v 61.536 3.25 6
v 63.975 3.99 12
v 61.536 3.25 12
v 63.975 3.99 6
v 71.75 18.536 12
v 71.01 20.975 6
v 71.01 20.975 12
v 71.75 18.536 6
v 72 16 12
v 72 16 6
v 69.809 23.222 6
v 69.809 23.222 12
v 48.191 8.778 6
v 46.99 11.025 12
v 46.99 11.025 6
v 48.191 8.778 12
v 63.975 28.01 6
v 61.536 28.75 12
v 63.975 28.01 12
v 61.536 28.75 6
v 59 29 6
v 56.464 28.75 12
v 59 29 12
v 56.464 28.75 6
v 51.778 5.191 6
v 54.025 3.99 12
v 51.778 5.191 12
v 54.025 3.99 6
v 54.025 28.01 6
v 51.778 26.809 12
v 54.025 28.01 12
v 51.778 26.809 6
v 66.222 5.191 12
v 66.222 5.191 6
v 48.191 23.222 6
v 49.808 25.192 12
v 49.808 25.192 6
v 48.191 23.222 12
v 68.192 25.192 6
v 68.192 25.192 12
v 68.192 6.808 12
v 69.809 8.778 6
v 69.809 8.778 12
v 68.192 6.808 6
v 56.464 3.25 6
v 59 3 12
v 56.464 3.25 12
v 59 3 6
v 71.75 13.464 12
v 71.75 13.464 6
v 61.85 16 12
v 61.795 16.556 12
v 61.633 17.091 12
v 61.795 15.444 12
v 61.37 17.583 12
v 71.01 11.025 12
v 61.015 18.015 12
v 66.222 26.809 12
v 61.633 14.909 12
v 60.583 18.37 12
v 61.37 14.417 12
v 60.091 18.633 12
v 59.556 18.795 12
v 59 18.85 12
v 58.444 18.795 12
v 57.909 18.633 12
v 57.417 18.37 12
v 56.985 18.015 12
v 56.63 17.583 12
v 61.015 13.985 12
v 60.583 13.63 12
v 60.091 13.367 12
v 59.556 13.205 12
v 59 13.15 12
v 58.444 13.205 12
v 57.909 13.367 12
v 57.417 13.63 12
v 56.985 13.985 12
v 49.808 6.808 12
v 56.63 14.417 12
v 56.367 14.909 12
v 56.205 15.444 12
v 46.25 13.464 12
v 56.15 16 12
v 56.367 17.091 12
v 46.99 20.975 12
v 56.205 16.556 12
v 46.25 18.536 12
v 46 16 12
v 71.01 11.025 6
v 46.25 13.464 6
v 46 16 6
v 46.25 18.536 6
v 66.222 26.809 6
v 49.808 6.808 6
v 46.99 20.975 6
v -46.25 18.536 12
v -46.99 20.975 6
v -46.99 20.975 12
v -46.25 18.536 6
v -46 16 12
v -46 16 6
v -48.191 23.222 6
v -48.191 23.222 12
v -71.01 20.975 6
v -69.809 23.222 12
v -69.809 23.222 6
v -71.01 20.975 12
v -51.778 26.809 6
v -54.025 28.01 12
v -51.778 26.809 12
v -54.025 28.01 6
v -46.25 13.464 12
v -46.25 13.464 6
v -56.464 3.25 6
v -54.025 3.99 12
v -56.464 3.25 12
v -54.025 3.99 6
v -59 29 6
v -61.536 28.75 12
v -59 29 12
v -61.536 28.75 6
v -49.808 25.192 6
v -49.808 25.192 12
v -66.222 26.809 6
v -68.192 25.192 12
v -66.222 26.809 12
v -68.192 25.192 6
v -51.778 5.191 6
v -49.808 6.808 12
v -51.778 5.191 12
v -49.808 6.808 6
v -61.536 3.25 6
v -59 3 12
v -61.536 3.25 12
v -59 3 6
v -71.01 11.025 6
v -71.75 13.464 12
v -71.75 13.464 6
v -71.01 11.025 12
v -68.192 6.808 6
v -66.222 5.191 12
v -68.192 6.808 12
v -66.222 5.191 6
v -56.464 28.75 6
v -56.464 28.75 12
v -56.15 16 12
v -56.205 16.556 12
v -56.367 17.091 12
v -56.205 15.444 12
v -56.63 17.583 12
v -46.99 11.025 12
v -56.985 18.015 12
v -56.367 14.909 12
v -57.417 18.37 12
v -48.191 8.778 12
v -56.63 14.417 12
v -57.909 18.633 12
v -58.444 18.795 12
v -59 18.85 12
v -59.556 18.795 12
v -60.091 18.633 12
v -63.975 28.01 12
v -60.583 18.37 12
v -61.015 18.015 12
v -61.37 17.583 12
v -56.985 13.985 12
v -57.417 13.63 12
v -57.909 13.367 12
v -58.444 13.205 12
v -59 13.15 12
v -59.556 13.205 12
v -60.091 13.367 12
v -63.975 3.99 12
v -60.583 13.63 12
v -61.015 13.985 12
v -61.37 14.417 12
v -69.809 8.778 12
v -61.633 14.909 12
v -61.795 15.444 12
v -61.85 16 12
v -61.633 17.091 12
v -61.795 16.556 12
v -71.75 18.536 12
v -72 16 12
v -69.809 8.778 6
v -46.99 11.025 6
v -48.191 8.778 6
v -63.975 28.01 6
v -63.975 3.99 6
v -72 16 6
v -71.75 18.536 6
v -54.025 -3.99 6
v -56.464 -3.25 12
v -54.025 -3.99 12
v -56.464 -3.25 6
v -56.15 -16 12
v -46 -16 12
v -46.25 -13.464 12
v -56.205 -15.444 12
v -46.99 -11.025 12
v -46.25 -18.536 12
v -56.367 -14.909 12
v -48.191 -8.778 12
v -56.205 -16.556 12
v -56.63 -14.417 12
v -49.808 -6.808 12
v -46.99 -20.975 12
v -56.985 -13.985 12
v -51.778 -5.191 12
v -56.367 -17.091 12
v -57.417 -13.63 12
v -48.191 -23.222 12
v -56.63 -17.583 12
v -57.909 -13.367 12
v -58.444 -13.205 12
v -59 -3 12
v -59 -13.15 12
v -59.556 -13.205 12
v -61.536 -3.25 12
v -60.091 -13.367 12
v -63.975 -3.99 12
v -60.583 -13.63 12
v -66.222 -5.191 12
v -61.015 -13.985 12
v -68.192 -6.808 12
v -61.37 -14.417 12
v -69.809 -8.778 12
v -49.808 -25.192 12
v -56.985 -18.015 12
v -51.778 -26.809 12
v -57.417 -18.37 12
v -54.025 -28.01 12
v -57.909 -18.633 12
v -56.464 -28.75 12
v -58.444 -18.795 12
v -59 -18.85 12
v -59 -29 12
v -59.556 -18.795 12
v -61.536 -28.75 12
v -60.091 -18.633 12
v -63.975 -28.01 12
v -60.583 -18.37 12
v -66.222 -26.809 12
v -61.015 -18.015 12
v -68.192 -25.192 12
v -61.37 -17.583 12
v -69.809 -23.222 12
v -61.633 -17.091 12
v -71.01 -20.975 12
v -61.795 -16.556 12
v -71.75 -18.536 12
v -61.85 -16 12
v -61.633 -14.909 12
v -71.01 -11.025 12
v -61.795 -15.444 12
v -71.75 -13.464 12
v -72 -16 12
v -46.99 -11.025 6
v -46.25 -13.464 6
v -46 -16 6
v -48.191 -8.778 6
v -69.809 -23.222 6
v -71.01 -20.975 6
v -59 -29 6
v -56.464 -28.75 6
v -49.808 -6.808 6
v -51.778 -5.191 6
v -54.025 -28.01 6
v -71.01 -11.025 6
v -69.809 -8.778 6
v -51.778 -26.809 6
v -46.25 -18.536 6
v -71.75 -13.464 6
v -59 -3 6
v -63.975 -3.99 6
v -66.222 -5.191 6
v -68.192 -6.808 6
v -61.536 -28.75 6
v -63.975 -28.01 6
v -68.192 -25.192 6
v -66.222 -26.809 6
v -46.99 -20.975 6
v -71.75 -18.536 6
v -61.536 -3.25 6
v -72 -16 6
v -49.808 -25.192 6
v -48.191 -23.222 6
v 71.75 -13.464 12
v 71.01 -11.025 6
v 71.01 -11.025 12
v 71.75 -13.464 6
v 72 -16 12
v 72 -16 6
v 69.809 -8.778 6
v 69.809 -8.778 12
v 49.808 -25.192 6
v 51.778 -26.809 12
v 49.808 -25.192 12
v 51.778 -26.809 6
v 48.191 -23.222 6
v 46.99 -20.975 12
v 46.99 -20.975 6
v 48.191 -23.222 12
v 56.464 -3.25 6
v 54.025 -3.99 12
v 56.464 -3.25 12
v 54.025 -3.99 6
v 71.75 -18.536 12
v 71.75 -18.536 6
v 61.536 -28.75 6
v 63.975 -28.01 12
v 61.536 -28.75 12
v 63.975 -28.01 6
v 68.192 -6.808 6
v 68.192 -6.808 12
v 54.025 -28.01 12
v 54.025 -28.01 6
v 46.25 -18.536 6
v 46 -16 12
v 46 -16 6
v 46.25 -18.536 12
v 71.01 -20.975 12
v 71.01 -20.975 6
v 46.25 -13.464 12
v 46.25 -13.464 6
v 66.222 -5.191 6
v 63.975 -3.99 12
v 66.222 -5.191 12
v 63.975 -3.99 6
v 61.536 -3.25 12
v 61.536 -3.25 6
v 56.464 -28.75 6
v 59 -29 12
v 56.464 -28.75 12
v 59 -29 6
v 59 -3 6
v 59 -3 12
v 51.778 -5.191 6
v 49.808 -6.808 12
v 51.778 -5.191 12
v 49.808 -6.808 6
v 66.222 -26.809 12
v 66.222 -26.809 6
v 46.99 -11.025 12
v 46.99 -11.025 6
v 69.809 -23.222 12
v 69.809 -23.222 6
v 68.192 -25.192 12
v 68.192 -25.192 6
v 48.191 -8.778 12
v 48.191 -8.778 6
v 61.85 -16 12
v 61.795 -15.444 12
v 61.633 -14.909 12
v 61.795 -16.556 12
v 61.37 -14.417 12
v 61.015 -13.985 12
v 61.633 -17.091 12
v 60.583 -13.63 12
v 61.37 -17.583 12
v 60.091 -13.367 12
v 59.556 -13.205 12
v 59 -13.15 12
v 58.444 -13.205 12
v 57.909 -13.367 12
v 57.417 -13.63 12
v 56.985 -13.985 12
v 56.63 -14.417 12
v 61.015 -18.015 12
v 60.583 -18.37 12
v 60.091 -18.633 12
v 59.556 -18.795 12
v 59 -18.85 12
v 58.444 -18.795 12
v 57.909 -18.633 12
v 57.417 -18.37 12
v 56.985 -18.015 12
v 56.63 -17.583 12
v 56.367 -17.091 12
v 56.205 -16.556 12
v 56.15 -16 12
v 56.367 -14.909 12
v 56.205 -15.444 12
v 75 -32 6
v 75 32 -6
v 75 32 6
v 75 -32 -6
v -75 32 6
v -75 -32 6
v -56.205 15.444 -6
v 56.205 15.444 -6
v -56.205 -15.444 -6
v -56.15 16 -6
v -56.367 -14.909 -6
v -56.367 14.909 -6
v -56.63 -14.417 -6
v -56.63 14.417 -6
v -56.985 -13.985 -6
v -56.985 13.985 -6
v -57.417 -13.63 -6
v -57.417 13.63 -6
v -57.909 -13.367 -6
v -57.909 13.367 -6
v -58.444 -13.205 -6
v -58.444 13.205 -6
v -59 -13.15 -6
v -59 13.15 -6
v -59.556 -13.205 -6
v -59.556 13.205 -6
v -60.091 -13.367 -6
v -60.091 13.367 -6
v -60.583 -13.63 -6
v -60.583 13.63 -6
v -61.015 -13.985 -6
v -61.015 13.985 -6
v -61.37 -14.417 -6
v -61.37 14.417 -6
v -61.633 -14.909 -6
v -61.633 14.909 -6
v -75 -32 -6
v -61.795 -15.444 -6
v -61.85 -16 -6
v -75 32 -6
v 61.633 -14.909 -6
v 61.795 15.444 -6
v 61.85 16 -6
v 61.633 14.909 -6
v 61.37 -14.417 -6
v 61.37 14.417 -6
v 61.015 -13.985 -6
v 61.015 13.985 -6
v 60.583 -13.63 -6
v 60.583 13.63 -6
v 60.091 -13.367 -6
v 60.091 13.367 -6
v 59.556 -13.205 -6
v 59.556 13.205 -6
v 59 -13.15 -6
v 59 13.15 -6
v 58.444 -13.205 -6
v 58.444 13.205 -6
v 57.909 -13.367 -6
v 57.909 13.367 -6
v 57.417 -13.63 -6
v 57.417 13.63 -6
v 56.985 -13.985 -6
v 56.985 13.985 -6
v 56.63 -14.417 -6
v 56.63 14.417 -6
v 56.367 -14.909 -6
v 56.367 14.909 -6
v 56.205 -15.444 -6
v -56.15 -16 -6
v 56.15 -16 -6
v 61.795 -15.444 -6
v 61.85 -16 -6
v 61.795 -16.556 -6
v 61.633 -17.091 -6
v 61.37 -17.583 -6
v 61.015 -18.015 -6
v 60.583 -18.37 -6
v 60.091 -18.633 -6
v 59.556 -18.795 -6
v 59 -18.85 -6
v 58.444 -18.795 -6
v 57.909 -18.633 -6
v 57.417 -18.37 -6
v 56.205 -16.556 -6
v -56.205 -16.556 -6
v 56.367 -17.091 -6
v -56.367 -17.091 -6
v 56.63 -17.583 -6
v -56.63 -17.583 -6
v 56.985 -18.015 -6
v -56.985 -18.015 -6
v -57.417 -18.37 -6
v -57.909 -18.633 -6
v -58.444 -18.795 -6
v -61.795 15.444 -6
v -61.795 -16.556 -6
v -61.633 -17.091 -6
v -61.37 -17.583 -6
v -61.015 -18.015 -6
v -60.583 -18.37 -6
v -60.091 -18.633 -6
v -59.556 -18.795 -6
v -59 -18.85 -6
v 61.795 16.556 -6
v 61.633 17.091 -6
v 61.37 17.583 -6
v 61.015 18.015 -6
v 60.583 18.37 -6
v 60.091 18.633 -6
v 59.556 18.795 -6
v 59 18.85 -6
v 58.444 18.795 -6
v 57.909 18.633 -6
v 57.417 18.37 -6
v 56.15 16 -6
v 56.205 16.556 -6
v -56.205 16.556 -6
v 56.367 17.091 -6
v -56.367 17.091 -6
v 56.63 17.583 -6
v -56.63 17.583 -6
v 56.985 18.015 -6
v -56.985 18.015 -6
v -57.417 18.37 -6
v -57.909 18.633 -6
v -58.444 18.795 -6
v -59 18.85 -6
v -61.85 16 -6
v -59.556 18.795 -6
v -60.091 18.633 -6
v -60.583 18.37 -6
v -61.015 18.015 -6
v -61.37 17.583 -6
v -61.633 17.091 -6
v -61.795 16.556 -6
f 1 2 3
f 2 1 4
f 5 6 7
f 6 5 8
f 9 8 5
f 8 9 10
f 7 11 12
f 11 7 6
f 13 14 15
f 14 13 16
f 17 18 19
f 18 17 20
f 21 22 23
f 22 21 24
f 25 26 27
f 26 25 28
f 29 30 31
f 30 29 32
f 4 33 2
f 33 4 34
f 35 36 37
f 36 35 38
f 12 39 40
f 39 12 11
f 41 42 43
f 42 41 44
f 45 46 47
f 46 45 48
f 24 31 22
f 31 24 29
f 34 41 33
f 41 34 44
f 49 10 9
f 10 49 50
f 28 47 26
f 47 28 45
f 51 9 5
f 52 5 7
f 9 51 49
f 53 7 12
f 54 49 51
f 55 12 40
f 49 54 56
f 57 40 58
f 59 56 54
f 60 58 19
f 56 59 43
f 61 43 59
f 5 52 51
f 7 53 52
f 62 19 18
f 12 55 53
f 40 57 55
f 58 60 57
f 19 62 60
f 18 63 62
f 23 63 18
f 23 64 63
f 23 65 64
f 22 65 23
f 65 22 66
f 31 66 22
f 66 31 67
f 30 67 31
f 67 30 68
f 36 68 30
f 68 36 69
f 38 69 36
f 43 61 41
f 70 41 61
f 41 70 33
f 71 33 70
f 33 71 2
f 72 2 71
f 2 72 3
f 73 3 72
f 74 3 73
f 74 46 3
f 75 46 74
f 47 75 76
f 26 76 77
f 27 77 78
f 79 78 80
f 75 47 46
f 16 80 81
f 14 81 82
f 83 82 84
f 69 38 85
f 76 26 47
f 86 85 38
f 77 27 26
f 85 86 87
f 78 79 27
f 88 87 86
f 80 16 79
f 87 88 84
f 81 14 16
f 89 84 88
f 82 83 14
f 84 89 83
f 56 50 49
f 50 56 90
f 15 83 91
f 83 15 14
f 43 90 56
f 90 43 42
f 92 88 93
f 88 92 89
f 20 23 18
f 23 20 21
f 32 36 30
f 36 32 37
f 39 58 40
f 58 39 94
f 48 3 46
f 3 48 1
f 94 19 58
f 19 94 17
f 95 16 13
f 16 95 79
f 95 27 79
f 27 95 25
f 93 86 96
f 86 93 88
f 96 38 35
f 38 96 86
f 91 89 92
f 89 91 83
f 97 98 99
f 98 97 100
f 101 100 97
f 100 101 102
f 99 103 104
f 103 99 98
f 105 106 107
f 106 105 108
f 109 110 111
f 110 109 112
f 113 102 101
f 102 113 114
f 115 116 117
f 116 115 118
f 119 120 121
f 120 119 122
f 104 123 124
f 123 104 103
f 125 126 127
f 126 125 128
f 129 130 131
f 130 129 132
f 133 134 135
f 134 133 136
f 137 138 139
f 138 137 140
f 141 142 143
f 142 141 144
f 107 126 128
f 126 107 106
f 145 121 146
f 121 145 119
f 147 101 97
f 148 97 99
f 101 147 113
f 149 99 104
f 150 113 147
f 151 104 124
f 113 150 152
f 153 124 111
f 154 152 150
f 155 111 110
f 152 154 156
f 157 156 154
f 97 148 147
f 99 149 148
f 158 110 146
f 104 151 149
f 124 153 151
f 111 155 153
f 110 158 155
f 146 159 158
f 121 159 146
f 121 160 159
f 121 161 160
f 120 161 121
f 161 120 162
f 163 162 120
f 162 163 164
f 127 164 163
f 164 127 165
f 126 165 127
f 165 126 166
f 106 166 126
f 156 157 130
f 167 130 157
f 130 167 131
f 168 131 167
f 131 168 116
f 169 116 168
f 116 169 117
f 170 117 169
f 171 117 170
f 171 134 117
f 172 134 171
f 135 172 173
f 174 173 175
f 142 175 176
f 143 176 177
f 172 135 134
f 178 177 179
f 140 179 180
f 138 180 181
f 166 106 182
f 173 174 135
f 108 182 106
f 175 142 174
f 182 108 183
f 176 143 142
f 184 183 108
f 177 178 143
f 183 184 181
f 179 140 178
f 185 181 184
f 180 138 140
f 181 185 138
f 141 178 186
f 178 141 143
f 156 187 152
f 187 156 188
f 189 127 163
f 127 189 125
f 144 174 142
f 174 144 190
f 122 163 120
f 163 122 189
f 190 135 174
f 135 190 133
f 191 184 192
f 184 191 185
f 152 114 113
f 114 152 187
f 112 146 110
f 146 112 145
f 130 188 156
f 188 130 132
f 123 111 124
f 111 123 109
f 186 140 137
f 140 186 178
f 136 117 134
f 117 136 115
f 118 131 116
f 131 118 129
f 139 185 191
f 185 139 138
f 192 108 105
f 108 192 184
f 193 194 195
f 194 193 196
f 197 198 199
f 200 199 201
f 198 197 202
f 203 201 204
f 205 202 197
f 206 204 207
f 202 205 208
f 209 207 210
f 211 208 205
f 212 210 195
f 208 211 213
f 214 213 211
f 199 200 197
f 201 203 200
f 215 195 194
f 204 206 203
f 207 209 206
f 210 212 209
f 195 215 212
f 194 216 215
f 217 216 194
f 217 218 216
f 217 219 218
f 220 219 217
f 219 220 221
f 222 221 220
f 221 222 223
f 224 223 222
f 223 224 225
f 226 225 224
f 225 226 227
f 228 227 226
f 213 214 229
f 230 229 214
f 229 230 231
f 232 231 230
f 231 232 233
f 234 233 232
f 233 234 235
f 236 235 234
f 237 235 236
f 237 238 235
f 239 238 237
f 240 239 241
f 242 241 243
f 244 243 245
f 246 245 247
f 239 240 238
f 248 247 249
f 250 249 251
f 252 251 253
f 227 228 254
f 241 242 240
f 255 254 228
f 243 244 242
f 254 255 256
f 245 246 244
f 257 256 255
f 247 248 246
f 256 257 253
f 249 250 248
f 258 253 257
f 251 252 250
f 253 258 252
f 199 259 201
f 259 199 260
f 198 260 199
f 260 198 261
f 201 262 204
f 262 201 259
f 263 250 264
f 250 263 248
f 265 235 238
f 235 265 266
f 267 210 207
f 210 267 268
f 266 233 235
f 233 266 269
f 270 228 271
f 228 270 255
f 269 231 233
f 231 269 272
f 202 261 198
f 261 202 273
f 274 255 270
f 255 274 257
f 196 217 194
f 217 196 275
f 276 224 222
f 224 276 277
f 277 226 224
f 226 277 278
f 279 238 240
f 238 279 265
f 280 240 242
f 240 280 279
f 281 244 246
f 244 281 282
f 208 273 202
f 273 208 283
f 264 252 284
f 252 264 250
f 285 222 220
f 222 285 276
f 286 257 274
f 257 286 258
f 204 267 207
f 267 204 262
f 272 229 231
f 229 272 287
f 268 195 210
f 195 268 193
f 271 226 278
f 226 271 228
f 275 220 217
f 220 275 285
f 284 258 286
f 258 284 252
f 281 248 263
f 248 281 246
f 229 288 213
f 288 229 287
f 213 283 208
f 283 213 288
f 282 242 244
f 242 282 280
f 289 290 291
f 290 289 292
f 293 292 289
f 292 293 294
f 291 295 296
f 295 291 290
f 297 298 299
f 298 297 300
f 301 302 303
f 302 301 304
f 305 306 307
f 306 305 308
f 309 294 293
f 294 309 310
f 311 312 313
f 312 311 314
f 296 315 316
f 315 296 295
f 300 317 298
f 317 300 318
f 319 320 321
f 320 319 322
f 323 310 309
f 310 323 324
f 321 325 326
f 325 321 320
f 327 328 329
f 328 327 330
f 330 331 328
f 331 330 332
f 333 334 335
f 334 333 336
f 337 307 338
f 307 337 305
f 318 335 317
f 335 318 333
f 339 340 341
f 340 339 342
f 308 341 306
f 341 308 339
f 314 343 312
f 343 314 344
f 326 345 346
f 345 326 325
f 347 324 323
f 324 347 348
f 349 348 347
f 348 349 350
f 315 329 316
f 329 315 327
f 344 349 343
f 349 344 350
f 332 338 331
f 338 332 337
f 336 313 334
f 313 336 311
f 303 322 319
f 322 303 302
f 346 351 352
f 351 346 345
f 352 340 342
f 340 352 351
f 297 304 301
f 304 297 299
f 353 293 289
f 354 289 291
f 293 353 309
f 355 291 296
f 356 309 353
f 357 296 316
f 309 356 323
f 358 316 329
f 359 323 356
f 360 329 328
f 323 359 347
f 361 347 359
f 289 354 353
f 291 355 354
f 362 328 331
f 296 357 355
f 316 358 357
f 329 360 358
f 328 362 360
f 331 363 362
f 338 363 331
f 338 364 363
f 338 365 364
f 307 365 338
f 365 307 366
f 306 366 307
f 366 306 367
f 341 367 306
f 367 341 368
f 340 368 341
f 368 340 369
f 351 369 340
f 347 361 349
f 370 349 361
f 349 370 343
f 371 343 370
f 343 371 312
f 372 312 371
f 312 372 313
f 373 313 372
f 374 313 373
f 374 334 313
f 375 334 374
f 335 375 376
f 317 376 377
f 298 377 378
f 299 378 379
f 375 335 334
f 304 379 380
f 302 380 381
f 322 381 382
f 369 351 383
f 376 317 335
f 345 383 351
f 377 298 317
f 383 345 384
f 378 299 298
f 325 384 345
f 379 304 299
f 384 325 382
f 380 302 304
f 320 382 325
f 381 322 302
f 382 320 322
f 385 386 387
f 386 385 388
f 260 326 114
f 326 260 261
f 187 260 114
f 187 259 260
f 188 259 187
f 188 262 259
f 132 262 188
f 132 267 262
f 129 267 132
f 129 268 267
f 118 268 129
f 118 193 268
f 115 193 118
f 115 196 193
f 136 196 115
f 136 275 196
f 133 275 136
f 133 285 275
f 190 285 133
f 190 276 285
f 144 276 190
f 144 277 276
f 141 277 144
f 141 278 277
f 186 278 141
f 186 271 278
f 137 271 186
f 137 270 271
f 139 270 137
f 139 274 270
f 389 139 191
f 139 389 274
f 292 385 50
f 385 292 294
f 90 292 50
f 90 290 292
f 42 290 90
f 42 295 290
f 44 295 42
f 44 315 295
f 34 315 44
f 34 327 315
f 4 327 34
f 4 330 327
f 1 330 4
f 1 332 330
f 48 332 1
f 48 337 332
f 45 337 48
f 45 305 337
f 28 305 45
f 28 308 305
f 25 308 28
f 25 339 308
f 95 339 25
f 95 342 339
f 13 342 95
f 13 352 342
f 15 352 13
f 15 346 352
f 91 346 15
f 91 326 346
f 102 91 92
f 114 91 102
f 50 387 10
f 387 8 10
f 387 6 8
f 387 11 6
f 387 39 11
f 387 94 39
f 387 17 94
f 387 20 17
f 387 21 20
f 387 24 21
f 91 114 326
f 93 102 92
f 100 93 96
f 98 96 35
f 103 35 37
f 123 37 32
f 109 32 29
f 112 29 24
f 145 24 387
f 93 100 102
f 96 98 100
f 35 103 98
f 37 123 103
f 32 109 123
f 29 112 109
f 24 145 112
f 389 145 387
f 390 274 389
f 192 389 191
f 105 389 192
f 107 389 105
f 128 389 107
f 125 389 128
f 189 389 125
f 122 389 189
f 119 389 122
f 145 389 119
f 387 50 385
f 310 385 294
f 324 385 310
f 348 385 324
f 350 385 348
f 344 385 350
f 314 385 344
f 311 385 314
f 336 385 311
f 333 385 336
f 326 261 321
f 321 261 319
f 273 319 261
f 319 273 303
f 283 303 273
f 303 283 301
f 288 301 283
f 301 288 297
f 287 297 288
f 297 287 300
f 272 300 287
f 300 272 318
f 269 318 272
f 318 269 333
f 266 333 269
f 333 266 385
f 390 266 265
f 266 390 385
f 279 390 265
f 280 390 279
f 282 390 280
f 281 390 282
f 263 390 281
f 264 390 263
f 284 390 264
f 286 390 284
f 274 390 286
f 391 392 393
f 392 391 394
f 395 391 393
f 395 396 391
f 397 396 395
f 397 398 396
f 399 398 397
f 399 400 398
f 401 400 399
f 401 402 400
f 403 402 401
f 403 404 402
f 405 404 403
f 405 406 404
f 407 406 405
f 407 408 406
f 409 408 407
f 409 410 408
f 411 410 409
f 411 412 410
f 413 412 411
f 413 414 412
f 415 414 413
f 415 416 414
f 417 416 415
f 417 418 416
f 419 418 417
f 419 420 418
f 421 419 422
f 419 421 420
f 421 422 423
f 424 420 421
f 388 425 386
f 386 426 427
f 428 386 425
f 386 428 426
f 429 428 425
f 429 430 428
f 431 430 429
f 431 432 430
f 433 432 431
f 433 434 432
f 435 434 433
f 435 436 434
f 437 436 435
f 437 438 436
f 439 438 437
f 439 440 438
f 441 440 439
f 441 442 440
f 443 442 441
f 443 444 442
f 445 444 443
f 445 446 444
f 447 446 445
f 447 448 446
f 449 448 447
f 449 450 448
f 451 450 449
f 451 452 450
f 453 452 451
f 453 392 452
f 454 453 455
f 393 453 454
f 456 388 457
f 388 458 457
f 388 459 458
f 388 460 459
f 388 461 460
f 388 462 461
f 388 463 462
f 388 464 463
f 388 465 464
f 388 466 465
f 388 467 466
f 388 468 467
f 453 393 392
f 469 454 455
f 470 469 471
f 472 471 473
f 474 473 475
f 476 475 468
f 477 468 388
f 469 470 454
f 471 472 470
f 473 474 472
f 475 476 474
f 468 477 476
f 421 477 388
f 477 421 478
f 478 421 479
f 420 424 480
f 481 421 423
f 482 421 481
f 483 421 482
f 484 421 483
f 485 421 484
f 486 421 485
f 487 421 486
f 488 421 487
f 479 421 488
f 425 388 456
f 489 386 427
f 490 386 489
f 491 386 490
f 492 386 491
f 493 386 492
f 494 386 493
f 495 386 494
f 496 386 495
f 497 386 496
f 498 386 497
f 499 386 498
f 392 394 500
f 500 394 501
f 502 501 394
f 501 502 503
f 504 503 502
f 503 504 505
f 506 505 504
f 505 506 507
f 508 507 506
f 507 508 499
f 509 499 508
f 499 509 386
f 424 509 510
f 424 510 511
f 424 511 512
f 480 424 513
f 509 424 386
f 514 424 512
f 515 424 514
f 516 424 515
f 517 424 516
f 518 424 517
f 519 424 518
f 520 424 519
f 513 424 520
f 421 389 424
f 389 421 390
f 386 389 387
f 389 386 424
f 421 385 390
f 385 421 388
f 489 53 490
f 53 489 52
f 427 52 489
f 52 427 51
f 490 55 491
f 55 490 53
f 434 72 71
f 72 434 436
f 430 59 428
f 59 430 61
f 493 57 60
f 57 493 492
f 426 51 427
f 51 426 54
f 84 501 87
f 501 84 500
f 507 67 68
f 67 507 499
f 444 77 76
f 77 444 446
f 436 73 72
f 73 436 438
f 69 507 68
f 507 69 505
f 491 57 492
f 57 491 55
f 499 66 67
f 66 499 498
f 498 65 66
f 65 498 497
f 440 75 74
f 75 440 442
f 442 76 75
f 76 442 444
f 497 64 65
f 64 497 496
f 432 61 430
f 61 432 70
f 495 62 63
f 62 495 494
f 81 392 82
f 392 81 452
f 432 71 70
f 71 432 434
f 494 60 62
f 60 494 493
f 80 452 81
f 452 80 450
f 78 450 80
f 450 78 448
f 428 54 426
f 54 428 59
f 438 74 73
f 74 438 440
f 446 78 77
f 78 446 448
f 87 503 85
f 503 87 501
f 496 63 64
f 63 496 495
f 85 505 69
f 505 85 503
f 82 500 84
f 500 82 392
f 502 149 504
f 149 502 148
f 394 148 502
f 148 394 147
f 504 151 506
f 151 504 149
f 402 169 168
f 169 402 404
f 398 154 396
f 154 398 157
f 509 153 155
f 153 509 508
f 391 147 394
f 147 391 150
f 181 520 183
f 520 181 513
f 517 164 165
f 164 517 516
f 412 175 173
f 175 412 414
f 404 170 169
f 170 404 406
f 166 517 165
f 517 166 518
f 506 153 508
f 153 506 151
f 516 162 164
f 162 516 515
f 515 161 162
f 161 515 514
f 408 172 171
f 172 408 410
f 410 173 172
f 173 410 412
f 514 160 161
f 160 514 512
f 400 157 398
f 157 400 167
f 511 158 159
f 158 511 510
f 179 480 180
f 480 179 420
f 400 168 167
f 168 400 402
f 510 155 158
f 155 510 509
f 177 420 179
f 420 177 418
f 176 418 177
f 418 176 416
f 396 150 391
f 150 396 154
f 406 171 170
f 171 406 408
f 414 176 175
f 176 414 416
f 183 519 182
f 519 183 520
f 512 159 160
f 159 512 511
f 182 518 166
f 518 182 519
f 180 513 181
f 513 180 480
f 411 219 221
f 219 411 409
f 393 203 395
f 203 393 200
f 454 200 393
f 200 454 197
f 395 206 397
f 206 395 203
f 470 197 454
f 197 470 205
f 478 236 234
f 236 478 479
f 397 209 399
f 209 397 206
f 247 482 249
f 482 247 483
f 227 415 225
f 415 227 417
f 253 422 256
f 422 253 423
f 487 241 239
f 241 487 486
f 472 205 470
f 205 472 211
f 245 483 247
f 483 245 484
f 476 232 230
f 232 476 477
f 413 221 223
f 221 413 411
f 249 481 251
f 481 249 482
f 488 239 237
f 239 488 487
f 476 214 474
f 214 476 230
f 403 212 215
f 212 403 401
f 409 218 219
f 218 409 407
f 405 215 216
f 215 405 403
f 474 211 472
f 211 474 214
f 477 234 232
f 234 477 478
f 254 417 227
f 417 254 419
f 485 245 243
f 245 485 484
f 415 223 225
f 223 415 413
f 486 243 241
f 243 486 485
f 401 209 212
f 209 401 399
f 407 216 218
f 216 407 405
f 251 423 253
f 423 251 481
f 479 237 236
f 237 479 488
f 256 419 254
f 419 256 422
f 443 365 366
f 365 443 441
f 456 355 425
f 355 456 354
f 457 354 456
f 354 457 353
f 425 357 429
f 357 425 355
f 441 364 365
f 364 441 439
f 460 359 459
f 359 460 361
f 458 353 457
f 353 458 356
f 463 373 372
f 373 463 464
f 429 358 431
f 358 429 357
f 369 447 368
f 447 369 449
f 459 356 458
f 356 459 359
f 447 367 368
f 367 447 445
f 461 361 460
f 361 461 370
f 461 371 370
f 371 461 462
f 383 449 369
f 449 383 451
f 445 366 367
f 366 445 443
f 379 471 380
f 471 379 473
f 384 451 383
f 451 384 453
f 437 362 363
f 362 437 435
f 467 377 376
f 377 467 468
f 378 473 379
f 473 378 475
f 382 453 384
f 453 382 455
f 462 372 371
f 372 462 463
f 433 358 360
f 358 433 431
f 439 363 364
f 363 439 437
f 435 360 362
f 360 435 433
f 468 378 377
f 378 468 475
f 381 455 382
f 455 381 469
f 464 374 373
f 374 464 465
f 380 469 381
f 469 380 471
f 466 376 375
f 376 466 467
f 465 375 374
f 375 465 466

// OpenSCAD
$fn = 32;

// ----------------------------------------------------------------------
// Anchor pads 150 x 64 x 18
// four corner bosses with anchor holes
// ----------------------------------------------------------------------

// --- parameters (mm) ---
plate = [150, 64, 12];  // base plate size (x, y, z)
pads = 4;               // boss count, one per corner
edge = 16;              // boss centre offset from the plate edge
boss_d = 26;            // boss diameter
boss_h = 6;             // boss height above the base plate
bore_d = 5.5;           // nominal hole diameter from the drawing
print_allowance = 0.2;  // clearance added for printing

// --- derived feature positions (mm) ---
hole_d = bore_d + print_allowance;  // = 5.7   hole diameter as printed
height = plate[2] + boss_h;         // = 18   overall height of the part
corner_x = plate[0] / 2 - edge;     // = 59   boss centre X
corner_y = plate[1] / 2 - edge;     // = 16   boss centre Y
feature_centers = [
  [corner_x, corner_y],
  [-corner_x, corner_y],
  [-corner_x, -corner_y],
  [corner_x, -corner_y]
];   // boss centres, anchor holes are drilled there

// base plate, four bosses standing on it, anchor holes all the way through
difference() {
  union() {
    cube(plate, center = true);
    for (centre = feature_centers)
      translate([centre[0], centre[1], plate[2] / 2 - 1])
        cylinder(d = boss_d, h = boss_h + 1);
  }
  for (centre = feature_centers)
    translate([centre[0], centre[1], -height])
      cylinder(d = hole_d, h = 2 * height + 2);  // through boss and plate
}
